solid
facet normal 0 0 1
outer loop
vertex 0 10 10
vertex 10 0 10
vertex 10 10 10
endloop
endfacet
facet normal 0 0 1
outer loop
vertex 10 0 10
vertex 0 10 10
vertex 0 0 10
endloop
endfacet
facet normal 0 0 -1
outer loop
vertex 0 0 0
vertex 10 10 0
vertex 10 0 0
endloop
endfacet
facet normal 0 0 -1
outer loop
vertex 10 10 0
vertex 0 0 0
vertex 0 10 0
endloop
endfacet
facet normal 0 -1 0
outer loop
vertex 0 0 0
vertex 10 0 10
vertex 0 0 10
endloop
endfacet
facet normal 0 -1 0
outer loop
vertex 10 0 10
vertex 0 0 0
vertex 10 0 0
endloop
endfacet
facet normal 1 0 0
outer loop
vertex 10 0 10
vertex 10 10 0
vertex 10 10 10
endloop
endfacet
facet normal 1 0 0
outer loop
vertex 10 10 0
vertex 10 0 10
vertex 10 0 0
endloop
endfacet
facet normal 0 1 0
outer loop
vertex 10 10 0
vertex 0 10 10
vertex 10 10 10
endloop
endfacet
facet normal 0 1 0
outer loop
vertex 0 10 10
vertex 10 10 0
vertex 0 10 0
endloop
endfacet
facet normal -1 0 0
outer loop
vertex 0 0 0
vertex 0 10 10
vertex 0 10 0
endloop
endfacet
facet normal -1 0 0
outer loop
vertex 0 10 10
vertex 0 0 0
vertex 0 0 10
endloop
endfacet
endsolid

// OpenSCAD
$fs=0.25;$fa=6;
translate([5,5,5])cube([10,10,10],center=true);
